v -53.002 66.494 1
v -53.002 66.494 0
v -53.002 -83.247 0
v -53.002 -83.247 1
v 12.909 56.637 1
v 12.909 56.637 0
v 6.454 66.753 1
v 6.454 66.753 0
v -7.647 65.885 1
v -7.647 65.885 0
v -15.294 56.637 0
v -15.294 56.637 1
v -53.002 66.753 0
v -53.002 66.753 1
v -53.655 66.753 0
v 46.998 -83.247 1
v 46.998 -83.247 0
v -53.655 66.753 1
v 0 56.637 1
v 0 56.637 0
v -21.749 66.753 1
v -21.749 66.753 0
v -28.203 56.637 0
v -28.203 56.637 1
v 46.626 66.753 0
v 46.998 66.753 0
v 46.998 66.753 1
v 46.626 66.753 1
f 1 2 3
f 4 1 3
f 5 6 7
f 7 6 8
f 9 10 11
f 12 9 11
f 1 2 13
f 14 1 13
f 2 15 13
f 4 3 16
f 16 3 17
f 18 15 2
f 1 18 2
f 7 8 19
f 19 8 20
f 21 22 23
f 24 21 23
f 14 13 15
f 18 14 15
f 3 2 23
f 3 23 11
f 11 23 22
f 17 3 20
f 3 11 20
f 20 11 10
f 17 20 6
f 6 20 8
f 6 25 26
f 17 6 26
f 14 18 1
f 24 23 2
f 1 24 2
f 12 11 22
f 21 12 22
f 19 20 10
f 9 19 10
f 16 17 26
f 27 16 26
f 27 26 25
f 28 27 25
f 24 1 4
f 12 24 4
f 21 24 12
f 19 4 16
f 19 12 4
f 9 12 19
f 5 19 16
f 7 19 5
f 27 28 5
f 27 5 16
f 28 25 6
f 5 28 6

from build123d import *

# Parameters (mm, degrees)
F1_DEPTH = 1


with BuildPart() as f1:
    # F0 (on Top) → F1 (new body)
    with BuildSketch(Plane.XY):
        Polygon((-28.203126, 56.636945), (-53.001562, 66.493575), (-53.001562, -83.246687), (46.998438, -83.246687), (46.998438, 66.753313), (46.625555, 66.753313), (12.908772, 56.636945), (6.454386, 66.753313), (0, 56.636945), (-7.647177, 65.884685), (-15.294354, 56.636945), (-21.74874, 66.753313), align=None)
        Polygon((-53.001562, 66.493575), (-53.001562, 66.753313), (-53.655041, 66.753313), align=None)
    extrude(amount=F1_DEPTH)


solid = f1.part
